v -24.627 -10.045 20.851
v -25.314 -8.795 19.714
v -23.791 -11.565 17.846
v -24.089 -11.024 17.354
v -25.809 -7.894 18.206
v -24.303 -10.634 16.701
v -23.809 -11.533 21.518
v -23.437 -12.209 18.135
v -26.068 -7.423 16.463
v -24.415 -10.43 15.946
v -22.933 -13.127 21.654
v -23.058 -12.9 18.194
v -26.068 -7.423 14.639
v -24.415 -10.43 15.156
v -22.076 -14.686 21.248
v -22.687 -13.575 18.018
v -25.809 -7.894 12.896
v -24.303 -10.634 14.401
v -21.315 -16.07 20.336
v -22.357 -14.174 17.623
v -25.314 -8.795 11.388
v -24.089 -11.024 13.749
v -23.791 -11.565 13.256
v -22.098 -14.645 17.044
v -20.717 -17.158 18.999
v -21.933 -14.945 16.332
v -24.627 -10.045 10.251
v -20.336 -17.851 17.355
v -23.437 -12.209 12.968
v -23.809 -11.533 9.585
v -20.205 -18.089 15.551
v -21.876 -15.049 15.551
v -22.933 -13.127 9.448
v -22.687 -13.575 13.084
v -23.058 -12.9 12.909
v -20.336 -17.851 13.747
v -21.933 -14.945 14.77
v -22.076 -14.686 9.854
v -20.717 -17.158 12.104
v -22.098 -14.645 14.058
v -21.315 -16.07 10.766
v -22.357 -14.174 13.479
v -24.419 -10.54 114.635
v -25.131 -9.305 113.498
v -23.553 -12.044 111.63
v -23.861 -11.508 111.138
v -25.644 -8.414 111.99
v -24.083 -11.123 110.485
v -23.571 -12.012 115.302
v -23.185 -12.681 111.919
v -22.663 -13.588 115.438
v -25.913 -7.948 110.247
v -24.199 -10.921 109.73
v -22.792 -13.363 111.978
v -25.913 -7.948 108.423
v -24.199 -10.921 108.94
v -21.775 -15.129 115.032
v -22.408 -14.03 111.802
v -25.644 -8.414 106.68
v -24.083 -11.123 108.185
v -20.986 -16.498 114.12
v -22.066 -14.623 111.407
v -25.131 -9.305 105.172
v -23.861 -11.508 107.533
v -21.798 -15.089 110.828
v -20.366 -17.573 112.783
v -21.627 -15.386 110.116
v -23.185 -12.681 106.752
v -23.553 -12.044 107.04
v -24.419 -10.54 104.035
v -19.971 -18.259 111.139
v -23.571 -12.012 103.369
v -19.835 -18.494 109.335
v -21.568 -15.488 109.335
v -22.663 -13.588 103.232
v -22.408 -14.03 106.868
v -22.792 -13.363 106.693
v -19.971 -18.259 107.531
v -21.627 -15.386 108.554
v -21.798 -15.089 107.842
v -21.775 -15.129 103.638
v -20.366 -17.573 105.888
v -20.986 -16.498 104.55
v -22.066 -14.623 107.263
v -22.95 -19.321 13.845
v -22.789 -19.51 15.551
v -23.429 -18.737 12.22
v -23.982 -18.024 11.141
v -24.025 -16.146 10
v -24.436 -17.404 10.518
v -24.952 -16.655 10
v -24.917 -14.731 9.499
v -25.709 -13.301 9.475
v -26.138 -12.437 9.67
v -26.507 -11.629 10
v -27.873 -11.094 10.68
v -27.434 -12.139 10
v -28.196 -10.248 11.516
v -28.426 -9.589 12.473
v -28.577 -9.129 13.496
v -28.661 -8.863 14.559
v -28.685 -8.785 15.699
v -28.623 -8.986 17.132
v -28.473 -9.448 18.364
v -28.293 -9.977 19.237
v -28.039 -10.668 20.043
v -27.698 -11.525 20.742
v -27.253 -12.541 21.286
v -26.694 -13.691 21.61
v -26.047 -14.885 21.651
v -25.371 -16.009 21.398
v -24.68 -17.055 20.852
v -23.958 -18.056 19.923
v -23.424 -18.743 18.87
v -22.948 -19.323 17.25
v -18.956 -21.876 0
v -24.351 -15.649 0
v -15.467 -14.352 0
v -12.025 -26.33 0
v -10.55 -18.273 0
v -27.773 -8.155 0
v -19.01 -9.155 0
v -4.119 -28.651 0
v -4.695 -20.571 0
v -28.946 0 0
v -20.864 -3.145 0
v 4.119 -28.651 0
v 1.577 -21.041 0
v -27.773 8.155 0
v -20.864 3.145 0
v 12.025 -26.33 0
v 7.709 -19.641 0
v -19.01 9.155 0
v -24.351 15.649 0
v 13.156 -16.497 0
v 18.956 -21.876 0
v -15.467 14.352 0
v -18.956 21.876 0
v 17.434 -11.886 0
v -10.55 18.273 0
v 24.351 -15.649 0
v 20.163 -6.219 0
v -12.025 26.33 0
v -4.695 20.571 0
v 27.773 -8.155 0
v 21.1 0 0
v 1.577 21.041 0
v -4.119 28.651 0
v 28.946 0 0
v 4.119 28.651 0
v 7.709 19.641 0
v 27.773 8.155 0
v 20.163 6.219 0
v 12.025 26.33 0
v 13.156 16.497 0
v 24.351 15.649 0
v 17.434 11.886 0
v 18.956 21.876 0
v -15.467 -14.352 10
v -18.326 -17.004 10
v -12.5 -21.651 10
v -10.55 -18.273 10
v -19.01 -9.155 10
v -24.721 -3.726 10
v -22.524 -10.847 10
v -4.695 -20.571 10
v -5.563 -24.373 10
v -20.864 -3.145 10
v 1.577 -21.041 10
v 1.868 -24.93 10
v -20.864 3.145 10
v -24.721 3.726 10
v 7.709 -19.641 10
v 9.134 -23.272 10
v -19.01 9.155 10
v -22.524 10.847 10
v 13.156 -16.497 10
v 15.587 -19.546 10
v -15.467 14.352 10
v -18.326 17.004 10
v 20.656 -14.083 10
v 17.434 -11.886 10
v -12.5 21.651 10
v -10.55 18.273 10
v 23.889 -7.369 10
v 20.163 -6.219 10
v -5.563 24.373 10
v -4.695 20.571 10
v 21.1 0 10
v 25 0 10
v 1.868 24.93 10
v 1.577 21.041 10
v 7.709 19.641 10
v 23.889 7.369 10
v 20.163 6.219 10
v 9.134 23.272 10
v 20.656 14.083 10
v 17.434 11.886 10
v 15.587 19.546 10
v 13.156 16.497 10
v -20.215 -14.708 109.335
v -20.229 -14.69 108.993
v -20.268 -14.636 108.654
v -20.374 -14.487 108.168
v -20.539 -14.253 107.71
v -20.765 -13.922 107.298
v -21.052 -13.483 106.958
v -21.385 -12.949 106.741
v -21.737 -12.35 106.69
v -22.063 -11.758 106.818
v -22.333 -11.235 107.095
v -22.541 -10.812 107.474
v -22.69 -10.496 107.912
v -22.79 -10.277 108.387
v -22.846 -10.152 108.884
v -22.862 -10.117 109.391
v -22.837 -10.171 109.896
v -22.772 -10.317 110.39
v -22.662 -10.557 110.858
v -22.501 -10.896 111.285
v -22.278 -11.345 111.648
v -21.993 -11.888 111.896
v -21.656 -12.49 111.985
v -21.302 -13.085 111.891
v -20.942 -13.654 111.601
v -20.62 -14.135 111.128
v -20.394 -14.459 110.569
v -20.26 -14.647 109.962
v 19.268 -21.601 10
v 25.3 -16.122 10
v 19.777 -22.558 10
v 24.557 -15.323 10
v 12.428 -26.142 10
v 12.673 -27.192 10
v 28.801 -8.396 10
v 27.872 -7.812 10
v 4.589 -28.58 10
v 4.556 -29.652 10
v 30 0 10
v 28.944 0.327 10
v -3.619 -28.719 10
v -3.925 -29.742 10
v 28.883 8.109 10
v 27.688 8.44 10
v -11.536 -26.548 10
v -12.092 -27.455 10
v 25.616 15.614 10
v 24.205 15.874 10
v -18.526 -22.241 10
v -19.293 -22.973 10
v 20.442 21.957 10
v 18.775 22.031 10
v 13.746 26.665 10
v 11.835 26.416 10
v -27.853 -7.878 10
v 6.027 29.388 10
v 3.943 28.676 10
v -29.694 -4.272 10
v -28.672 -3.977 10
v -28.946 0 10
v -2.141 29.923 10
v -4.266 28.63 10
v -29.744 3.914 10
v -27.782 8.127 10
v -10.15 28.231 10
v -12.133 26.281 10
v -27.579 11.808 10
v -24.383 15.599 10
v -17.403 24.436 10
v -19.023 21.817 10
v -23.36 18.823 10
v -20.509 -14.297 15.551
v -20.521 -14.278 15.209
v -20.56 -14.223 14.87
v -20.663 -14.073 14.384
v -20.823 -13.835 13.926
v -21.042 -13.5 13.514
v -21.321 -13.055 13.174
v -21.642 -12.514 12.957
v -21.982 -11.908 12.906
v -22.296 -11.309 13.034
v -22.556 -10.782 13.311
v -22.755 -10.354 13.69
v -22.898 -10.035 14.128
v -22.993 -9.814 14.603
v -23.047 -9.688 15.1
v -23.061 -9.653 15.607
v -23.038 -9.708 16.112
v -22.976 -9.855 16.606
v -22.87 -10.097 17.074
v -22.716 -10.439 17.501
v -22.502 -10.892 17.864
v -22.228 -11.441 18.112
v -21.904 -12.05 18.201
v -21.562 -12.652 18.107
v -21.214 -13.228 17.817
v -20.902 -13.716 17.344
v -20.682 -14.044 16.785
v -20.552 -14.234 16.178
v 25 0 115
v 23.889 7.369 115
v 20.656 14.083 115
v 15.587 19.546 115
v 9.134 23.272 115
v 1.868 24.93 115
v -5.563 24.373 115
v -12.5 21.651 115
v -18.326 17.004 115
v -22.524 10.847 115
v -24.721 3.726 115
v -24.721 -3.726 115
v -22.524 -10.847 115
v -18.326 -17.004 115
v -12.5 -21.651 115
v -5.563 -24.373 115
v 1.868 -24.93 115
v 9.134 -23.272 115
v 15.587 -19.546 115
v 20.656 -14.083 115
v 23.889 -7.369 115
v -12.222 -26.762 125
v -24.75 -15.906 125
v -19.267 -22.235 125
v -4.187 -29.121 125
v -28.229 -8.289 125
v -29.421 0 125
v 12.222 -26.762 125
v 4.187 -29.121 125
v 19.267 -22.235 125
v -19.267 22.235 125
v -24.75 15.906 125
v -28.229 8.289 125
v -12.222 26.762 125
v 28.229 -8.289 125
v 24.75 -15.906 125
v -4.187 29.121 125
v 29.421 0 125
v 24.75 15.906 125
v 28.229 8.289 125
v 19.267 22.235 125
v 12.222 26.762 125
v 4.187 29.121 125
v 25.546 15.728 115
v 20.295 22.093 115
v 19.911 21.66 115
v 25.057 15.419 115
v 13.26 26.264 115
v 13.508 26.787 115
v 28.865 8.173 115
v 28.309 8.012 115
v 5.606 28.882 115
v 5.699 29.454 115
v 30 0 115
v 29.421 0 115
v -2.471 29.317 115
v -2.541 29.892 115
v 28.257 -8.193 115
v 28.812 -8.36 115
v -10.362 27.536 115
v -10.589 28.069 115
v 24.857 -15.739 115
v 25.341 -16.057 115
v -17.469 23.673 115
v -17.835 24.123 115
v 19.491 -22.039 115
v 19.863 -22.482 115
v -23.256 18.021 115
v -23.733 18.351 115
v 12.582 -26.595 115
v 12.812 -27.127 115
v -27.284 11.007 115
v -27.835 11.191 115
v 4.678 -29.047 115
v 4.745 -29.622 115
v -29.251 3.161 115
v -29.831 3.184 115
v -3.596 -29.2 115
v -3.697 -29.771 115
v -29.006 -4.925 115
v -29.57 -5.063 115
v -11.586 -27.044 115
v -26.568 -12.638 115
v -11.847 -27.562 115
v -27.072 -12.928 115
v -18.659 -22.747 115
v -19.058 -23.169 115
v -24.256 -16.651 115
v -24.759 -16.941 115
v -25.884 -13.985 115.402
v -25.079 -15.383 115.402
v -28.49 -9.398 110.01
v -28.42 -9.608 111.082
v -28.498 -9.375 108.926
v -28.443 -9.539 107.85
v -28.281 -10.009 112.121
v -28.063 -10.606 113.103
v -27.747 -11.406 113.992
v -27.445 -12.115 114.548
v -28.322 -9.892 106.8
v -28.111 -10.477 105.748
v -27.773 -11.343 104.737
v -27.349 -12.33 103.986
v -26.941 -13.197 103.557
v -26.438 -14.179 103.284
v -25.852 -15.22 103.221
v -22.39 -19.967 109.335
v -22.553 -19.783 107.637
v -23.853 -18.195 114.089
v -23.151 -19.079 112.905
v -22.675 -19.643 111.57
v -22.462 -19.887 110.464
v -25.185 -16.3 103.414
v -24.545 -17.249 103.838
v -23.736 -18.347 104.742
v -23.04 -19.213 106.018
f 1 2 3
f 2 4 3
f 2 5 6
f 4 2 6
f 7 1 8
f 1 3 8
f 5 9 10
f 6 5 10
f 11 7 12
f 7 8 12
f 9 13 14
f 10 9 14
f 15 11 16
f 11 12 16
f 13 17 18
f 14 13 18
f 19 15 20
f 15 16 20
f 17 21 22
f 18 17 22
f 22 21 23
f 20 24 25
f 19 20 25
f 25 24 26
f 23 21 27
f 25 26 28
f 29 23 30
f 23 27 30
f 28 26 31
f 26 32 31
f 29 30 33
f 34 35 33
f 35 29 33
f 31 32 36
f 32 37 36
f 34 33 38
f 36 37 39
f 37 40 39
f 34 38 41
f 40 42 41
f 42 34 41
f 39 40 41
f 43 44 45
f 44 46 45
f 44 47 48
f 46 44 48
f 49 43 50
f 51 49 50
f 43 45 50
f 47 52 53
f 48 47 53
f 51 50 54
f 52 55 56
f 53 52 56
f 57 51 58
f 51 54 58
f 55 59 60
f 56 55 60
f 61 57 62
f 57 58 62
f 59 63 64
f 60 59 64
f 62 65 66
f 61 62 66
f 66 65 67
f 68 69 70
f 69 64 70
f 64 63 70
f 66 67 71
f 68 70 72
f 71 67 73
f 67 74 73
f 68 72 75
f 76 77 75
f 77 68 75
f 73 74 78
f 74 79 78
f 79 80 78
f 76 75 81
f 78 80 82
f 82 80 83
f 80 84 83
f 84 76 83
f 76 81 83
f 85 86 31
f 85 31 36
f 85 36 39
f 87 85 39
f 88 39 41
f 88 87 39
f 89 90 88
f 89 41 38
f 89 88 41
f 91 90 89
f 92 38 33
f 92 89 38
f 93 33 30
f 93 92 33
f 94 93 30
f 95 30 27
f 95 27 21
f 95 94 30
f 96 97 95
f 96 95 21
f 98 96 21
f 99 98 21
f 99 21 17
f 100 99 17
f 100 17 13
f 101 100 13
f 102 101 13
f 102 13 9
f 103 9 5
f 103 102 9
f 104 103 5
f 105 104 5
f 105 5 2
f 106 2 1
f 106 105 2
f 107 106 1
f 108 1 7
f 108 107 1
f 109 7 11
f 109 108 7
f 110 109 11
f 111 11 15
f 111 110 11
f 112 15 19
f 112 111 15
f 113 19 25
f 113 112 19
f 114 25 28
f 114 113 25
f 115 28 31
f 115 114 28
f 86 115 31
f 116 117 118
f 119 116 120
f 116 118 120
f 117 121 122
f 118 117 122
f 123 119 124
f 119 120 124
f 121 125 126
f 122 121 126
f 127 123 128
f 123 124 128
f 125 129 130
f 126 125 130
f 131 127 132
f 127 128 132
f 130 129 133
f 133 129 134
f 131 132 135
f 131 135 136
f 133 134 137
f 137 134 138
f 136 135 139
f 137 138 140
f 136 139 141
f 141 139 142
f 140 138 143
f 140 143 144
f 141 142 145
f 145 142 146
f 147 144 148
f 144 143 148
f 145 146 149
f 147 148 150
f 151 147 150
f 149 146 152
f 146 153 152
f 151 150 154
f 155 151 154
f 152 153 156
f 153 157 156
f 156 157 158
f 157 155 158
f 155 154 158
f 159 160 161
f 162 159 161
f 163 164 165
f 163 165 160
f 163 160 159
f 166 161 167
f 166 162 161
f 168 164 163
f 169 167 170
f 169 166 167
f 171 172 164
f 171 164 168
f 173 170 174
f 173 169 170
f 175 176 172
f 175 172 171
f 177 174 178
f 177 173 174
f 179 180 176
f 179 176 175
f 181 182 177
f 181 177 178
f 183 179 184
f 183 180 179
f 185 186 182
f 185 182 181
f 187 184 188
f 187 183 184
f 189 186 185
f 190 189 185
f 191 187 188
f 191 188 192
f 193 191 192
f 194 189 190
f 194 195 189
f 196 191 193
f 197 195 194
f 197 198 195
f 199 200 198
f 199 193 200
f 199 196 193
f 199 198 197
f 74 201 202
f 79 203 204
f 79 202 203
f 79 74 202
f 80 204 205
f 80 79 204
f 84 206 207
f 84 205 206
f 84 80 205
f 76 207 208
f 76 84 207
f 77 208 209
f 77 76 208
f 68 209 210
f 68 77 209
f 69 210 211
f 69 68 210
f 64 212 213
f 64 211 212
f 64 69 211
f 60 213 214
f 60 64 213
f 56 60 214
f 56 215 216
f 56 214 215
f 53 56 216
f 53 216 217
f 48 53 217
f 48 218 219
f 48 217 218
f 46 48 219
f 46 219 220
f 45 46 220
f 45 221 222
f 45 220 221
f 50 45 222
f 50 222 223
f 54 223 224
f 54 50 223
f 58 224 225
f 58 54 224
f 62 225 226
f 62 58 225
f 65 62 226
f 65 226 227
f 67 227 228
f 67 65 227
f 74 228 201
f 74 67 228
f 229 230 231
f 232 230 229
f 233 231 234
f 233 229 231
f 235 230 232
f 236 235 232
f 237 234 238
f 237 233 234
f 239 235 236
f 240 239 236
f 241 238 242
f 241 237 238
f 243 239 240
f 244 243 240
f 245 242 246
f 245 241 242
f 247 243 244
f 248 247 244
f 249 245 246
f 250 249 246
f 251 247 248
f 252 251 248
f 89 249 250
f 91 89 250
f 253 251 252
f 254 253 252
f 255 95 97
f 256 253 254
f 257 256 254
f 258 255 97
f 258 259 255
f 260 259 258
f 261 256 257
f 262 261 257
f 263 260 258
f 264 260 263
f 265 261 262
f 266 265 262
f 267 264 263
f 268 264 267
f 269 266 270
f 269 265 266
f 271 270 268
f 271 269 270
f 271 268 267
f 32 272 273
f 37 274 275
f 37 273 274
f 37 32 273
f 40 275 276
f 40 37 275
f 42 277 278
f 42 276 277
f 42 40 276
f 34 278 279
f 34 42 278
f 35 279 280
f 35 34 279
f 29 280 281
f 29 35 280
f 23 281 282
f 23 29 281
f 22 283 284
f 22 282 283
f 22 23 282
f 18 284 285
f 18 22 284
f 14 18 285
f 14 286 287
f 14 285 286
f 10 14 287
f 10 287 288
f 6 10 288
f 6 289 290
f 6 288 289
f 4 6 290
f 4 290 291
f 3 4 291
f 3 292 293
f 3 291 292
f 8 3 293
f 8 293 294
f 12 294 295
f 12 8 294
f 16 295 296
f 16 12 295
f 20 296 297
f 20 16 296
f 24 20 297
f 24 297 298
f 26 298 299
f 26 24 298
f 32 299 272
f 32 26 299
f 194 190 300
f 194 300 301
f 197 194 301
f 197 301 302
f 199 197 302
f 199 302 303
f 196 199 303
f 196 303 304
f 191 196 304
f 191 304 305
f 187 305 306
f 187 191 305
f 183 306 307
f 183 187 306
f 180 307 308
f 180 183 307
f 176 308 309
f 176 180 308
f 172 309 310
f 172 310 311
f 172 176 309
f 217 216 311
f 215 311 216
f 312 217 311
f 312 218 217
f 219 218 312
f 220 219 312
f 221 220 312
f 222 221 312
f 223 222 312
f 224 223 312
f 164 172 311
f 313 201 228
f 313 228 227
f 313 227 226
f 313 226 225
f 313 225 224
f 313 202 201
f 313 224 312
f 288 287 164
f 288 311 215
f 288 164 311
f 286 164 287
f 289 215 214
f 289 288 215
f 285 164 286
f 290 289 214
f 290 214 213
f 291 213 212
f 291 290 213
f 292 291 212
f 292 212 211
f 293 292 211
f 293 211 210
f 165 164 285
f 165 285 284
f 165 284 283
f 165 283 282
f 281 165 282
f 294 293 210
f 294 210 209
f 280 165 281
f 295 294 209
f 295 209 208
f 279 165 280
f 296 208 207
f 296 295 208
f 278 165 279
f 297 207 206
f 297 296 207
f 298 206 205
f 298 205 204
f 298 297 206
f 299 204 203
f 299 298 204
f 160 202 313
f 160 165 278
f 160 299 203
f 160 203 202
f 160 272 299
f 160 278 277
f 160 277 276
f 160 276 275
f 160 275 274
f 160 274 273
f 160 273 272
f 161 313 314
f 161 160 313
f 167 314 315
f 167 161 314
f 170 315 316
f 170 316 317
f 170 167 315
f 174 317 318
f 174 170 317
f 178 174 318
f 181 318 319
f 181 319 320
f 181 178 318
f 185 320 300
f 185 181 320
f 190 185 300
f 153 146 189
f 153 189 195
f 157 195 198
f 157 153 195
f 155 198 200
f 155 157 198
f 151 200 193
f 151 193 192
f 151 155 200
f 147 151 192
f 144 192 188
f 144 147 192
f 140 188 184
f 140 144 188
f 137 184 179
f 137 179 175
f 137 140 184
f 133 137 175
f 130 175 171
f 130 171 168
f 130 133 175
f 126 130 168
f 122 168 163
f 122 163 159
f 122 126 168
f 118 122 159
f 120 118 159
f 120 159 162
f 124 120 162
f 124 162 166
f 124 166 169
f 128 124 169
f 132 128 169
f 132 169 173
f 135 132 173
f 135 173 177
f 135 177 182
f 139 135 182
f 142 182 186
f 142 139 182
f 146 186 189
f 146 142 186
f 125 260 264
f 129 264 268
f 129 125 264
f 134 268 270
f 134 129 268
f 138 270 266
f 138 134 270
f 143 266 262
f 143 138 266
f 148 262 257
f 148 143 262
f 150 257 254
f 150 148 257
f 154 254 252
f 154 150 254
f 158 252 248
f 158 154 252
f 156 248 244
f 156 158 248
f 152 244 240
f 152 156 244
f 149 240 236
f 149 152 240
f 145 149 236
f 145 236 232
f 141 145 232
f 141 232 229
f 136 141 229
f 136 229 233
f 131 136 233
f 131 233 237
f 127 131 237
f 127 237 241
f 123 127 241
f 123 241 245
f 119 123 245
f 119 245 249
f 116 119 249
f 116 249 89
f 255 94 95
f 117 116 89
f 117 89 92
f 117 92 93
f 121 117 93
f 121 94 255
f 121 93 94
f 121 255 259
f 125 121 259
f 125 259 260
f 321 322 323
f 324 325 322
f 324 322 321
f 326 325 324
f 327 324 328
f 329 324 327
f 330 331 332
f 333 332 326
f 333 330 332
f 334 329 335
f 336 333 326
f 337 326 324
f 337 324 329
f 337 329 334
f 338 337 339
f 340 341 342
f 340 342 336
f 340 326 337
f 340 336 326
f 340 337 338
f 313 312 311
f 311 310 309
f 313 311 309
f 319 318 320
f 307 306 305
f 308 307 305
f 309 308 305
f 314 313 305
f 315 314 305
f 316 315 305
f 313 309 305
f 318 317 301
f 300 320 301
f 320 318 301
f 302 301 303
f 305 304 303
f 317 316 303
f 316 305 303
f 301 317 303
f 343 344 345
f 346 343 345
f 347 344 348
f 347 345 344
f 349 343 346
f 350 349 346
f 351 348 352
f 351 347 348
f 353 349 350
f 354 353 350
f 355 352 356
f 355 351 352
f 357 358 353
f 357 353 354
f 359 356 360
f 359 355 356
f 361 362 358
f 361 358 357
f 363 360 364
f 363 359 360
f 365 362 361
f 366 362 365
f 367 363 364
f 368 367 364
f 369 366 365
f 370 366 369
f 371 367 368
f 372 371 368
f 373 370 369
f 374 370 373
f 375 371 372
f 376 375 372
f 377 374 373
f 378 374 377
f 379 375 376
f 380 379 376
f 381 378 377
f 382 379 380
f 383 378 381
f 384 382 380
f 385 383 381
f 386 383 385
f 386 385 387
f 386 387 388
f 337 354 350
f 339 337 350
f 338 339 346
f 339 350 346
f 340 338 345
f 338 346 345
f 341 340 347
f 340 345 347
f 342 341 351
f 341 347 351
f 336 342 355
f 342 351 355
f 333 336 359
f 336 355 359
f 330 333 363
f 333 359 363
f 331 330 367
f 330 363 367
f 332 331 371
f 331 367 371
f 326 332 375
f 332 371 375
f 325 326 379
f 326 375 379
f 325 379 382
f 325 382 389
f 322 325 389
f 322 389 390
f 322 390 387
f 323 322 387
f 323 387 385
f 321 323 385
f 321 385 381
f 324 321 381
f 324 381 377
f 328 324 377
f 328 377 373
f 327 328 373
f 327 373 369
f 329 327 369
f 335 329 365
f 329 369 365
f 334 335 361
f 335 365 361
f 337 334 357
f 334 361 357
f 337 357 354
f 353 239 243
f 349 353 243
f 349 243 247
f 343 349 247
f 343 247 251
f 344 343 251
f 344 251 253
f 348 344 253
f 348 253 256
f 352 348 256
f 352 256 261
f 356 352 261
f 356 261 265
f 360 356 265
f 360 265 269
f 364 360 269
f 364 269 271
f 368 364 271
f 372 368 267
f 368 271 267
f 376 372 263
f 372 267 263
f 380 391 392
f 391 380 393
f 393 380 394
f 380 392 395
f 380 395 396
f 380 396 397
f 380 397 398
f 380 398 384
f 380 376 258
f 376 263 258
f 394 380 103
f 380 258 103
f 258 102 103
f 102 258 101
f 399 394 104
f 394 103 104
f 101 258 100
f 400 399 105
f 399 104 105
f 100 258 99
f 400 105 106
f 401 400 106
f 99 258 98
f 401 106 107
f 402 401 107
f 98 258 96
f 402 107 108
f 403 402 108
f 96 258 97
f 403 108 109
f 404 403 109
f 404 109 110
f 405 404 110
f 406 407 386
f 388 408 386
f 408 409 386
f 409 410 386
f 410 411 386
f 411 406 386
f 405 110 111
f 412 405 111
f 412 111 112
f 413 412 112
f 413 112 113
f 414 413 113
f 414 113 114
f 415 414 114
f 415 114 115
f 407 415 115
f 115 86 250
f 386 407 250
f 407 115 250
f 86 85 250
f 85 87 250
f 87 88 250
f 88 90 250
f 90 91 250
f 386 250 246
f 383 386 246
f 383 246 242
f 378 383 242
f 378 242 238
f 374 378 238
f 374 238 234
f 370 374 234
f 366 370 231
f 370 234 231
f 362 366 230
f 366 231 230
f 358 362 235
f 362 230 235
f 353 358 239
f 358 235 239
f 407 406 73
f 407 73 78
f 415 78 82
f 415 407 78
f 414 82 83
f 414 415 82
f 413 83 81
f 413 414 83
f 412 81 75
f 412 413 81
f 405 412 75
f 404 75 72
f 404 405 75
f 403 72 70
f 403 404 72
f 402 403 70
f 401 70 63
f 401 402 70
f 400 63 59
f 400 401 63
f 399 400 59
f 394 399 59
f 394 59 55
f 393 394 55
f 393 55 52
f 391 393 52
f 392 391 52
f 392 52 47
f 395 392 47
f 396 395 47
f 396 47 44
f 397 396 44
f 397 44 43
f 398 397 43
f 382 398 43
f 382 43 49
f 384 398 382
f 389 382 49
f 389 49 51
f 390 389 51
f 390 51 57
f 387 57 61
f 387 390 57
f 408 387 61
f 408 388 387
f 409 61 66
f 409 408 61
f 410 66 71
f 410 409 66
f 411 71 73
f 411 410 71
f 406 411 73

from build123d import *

# Parameters (mm, degrees)
SKETCH1_R                               = 30
SKETCH1_R_2                             = 25
BOSS_EXTRUDE1_DEPTH                     = 125
SKETCH2_R                               = 25
SKETCH2_R_2                             = 21.1
BOSS_EXTRUDE2_DEPTH                     = 10
SKETCH3_R                               = 25
BOSS_EXTRUDE3_DEPTH                     = 10
SKETCH11_R                              = 30
SKETCH11_R_2                            = 28.945980101
CUT_EXTRUDE2_DEPTH                      = 10
CUT_EXTRUDE3_START                      = -10
SKETCH12_R                              = 30
SKETCH12_R_2                            = 29.420954363
CUT_EXTRUDE3_DEPTH                      = 10
CBORE_START                             = -30.0000001
CBORE_FOR_M5_HEX_HEAD_BOLT2_OUTLINE_R   = 6.12
CBORE_FOR_M5_HEX_HEAD_BOLT2_DEPTH       = 3.5800001
CBORE_START_2                           = -26.42
CBORE_FOR_M5_HEX_HEAD_BOLT2_2_OUTLINE_R = 2.65
CBORE_FOR_M5_HEX_HEAD_BOLT2_2_DEPTH     = 1.560846858
CBORE_FOR_M5_HEX_HEAD_BOLT2_3_OUTLINE_R = 6.12
CBORE_FOR_M5_HEX_HEAD_BOLT2_3_DEPTH     = 3.5800001
CBORE_FOR_M5_HEX_HEAD_BOLT2_4_OUTLINE_R = 2.65
CBORE_FOR_M5_HEX_HEAD_BOLT2_4_DEPTH     = 1.560846858


# Read off the part's stored shape, not the designer's step: CBORE for M5 Hex Head Bolt2
with BuildPart() as part:
    # Sketch1 → Boss-Extrude1 (new body)
    with BuildSketch(Plane.XY):
        Circle(SKETCH1_R)
        Circle(SKETCH1_R_2, mode=Mode.SUBTRACT)
    extrude(amount=BOSS_EXTRUDE1_DEPTH)

    # Sketch2 → Boss-Extrude2 (add)
    with BuildSketch(Plane.XY):
        Circle(SKETCH2_R)
        Circle(SKETCH2_R_2, mode=Mode.SUBTRACT)
    extrude(amount=BOSS_EXTRUDE2_DEPTH)

    # Sketch3 → Boss-Extrude3 (add)
    with BuildSketch(Plane.XY.offset(115)):
        Circle(SKETCH3_R)
    extrude(amount=BOSS_EXTRUDE3_DEPTH)

    # Sketch11 → Cut-Extrude2 (cut)
    with BuildSketch(Plane(origin=(0, 0, 0), x_dir=(-1, 0, 0), z_dir=(0, 0, -1))):
        Circle(SKETCH11_R)
        Circle(SKETCH11_R_2, mode=Mode.SUBTRACT)
    extrude(amount=-CUT_EXTRUDE2_DEPTH, mode=Mode.SUBTRACT)

    # Sketch12 → Cut-Extrude3 (cut)
    with BuildSketch(Plane.XY.offset(125).offset(CUT_EXTRUDE3_START)):
        with Locations(Location((0, 0, 0), (0, 0, 180))):
            Circle(SKETCH12_R)
        Circle(SKETCH12_R_2, mode=Mode.SUBTRACT)
    extrude(amount=CUT_EXTRUDE3_DEPTH, mode=Mode.SUBTRACT)

    # CBORE for M5 Hex Head Bolt2 outline → CBORE for M5 Hex Head Bolt2 (cut)
    with BuildSketch(Plane(origin=(0, 0, 0), x_dir=(0.48168847359227474, -0.8763425211687177, 0), z_dir=(0.8763425211687177, 0.48168847359227485, 0)).offset(CBORE_START)):
        with Locations((0, -15.551111343)):
            Circle(CBORE_FOR_M5_HEX_HEAD_BOLT2_OUTLINE_R)
    extrude(amount=CBORE_FOR_M5_HEX_HEAD_BOLT2_DEPTH, mode=Mode.SUBTRACT)

    # CBORE for M5 Hex Head Bolt2 2 outline → CBORE for M5 Hex Head Bolt2 2 (cut)
    with BuildSketch(Plane(origin=(0, 0, 0), x_dir=(0.48168847359227474, -0.8763425211687177, 0), z_dir=(0.8763425211687177, 0.48168847359227485, 0)).offset(CBORE_START_2)):
        with Locations((0, -15.551111343)):
            Circle(CBORE_FOR_M5_HEX_HEAD_BOLT2_2_OUTLINE_R)
    extrude(amount=CBORE_FOR_M5_HEX_HEAD_BOLT2_2_DEPTH, mode=Mode.SUBTRACT)

    # CBORE for M5 Hex Head Bolt2 3 outline → CBORE for M5 Hex Head Bolt2 3 (cut)
    with BuildSketch(Plane(origin=(0, 0, 0), x_dir=(0.49930336052922, -0.8664272353546071, 0), z_dir=(0.8664272353546071, 0.49930336052922003, 0)).offset(CBORE_START)):
        with Locations((0, -109.335103389)):
            Circle(CBORE_FOR_M5_HEX_HEAD_BOLT2_3_OUTLINE_R)
    extrude(amount=CBORE_FOR_M5_HEX_HEAD_BOLT2_3_DEPTH, mode=Mode.SUBTRACT)

    # CBORE for M5 Hex Head Bolt2 4 outline → CBORE for M5 Hex Head Bolt2 4 (cut)
    with BuildSketch(Plane(origin=(0, 0, 0), x_dir=(0.49930336052922, -0.8664272353546071, 0), z_dir=(0.8664272353546071, 0.49930336052922003, 0)).offset(CBORE_START_2)):
        with Locations((0, -109.335103389)):
            Circle(CBORE_FOR_M5_HEX_HEAD_BOLT2_4_OUTLINE_R)
    extrude(amount=CBORE_FOR_M5_HEX_HEAD_BOLT2_4_DEPTH, mode=Mode.SUBTRACT)


solid = part.part
